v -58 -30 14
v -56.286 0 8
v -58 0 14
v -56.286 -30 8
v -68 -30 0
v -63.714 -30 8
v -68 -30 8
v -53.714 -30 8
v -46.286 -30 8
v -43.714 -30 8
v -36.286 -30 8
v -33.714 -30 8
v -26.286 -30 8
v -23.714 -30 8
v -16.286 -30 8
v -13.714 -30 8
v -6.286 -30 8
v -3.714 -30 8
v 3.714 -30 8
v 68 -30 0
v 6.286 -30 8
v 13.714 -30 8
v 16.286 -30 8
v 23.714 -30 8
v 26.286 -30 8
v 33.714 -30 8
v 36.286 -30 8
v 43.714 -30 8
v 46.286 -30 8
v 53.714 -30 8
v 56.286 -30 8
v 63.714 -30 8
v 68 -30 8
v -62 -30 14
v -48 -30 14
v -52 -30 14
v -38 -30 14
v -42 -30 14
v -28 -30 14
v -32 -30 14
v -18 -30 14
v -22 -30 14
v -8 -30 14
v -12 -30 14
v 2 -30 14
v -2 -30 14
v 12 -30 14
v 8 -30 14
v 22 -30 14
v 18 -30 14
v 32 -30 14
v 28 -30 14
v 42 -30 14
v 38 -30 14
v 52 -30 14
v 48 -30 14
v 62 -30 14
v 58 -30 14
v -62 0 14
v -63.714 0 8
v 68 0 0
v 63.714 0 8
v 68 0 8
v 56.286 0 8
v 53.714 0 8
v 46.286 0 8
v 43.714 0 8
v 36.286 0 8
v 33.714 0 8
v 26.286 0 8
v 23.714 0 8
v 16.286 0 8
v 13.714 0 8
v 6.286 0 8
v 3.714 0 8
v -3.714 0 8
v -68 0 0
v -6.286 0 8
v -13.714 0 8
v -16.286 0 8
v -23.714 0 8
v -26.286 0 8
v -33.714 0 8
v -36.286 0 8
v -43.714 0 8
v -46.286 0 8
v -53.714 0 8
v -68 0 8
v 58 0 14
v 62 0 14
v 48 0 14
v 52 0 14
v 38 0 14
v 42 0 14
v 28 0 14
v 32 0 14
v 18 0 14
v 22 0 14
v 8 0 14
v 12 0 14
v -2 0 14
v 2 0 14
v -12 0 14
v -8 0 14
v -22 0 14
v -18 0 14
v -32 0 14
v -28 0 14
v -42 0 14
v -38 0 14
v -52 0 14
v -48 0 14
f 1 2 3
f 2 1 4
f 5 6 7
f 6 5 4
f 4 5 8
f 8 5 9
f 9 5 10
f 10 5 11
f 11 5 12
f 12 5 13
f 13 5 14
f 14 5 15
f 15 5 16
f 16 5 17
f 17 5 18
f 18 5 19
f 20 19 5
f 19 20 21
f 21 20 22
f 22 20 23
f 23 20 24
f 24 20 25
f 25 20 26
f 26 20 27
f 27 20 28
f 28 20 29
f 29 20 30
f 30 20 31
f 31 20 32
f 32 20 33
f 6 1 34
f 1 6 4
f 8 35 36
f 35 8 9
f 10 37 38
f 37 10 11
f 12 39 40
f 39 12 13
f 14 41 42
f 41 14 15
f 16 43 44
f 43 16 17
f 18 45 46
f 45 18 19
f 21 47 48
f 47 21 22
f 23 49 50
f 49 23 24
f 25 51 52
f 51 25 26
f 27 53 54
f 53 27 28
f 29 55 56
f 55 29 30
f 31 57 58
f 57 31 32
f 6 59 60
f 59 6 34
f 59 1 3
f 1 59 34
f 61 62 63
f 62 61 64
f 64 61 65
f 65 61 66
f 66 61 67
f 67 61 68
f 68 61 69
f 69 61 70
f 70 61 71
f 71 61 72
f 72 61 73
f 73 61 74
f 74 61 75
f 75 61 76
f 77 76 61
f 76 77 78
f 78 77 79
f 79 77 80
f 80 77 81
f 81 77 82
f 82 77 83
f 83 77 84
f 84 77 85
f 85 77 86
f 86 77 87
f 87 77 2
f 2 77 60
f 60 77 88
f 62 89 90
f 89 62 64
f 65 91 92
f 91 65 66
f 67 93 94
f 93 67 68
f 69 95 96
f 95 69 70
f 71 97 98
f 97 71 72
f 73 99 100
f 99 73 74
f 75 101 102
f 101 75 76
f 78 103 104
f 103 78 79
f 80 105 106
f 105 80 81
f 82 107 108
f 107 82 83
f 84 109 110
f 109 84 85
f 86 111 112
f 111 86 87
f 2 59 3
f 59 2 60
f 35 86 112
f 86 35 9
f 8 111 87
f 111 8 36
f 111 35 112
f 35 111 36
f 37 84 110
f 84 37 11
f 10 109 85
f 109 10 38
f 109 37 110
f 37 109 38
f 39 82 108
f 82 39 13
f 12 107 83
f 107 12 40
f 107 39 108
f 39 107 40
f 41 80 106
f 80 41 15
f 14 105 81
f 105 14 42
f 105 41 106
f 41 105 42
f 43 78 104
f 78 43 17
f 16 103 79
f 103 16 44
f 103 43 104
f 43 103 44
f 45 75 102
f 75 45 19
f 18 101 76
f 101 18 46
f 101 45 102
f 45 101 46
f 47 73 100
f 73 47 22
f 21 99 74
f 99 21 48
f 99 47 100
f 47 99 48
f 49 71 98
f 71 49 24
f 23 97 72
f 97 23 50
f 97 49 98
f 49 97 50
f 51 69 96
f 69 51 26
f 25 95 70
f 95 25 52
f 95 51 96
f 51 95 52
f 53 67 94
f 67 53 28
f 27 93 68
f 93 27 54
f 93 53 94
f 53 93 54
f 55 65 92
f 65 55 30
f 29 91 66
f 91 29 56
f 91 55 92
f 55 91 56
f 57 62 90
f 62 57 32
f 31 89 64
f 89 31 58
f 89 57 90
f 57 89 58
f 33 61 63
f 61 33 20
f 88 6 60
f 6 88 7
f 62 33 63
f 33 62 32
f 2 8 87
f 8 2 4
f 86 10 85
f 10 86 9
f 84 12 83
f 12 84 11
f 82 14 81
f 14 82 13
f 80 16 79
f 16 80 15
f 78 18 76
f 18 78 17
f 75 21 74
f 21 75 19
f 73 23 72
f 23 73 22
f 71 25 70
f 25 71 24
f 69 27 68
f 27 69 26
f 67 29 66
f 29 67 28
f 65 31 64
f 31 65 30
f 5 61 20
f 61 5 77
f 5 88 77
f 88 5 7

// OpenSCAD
$fn = 32;

// ----------------------------------------------------------------------
// Toothed rack, 13 teeth
// 10 mm pitch, 6 mm teeth
// ----------------------------------------------------------------------

// --- parameters (mm) ---
bar_w = 30;   // bar width (Y)
bar_h = 8;    // bar height (Z)
teeth = 13;   // number of teeth
pitch = 10;   // tooth pitch
tooth_h = 6;  // tooth height above the bar
root_w = 8;   // tooth width at the root
crest_w = 4;  // tooth width at the crest

// --- derived feature positions (mm) ---
span = (teeth - 1) * pitch;  // = 120   distance between the outer teeth
bar_l = span + root_w + 8;   // = 136   bar length: teeth plus 4 mm at each end
tooth_x = -span / 2;         // = -60   X of the first tooth
height = bar_h + tooth_h;    // = 14   overall height
feature_centers = [
  [tooth_x + 0 * pitch, -bar_w / 2],
  [tooth_x + 1 * pitch, -bar_w / 2],
  [tooth_x + 2 * pitch, -bar_w / 2],
  [tooth_x + 3 * pitch, -bar_w / 2],
  [tooth_x + 4 * pitch, -bar_w / 2],
  [tooth_x + 5 * pitch, -bar_w / 2],
  [tooth_x + 6 * pitch, -bar_w / 2],
  [tooth_x + 7 * pitch, -bar_w / 2],
  [tooth_x + 8 * pitch, -bar_w / 2],
  [tooth_x + 9 * pitch, -bar_w / 2],
  [tooth_x + 10 * pitch, -bar_w / 2],
  [tooth_x + 11 * pitch, -bar_w / 2],
  [tooth_x + 12 * pitch, -bar_w / 2]
];   // tooth centre line, drives the tooth loop

// bar with a rack of teeth, one extruded trapezoium per centre
module rack_tooth() {
  linear_extrude(height = bar_w)
    polygon(points = [
      [0, 0],
      [root_w, 0],
      [root_w / 2 + crest_w / 2, tooth_h + 1],
      [root_w / 2 - crest_w / 2, tooth_h + 1]
    ]);
}

union() {
  translate([-bar_l / 2, -bar_w, 0]) cube([bar_l, bar_w, bar_h]);
  for (centre = feature_centers)
    translate([centre[0] - root_w / 2, 0, bar_h - 1]) rotate([90, 0, 0]) rack_tooth();
}
